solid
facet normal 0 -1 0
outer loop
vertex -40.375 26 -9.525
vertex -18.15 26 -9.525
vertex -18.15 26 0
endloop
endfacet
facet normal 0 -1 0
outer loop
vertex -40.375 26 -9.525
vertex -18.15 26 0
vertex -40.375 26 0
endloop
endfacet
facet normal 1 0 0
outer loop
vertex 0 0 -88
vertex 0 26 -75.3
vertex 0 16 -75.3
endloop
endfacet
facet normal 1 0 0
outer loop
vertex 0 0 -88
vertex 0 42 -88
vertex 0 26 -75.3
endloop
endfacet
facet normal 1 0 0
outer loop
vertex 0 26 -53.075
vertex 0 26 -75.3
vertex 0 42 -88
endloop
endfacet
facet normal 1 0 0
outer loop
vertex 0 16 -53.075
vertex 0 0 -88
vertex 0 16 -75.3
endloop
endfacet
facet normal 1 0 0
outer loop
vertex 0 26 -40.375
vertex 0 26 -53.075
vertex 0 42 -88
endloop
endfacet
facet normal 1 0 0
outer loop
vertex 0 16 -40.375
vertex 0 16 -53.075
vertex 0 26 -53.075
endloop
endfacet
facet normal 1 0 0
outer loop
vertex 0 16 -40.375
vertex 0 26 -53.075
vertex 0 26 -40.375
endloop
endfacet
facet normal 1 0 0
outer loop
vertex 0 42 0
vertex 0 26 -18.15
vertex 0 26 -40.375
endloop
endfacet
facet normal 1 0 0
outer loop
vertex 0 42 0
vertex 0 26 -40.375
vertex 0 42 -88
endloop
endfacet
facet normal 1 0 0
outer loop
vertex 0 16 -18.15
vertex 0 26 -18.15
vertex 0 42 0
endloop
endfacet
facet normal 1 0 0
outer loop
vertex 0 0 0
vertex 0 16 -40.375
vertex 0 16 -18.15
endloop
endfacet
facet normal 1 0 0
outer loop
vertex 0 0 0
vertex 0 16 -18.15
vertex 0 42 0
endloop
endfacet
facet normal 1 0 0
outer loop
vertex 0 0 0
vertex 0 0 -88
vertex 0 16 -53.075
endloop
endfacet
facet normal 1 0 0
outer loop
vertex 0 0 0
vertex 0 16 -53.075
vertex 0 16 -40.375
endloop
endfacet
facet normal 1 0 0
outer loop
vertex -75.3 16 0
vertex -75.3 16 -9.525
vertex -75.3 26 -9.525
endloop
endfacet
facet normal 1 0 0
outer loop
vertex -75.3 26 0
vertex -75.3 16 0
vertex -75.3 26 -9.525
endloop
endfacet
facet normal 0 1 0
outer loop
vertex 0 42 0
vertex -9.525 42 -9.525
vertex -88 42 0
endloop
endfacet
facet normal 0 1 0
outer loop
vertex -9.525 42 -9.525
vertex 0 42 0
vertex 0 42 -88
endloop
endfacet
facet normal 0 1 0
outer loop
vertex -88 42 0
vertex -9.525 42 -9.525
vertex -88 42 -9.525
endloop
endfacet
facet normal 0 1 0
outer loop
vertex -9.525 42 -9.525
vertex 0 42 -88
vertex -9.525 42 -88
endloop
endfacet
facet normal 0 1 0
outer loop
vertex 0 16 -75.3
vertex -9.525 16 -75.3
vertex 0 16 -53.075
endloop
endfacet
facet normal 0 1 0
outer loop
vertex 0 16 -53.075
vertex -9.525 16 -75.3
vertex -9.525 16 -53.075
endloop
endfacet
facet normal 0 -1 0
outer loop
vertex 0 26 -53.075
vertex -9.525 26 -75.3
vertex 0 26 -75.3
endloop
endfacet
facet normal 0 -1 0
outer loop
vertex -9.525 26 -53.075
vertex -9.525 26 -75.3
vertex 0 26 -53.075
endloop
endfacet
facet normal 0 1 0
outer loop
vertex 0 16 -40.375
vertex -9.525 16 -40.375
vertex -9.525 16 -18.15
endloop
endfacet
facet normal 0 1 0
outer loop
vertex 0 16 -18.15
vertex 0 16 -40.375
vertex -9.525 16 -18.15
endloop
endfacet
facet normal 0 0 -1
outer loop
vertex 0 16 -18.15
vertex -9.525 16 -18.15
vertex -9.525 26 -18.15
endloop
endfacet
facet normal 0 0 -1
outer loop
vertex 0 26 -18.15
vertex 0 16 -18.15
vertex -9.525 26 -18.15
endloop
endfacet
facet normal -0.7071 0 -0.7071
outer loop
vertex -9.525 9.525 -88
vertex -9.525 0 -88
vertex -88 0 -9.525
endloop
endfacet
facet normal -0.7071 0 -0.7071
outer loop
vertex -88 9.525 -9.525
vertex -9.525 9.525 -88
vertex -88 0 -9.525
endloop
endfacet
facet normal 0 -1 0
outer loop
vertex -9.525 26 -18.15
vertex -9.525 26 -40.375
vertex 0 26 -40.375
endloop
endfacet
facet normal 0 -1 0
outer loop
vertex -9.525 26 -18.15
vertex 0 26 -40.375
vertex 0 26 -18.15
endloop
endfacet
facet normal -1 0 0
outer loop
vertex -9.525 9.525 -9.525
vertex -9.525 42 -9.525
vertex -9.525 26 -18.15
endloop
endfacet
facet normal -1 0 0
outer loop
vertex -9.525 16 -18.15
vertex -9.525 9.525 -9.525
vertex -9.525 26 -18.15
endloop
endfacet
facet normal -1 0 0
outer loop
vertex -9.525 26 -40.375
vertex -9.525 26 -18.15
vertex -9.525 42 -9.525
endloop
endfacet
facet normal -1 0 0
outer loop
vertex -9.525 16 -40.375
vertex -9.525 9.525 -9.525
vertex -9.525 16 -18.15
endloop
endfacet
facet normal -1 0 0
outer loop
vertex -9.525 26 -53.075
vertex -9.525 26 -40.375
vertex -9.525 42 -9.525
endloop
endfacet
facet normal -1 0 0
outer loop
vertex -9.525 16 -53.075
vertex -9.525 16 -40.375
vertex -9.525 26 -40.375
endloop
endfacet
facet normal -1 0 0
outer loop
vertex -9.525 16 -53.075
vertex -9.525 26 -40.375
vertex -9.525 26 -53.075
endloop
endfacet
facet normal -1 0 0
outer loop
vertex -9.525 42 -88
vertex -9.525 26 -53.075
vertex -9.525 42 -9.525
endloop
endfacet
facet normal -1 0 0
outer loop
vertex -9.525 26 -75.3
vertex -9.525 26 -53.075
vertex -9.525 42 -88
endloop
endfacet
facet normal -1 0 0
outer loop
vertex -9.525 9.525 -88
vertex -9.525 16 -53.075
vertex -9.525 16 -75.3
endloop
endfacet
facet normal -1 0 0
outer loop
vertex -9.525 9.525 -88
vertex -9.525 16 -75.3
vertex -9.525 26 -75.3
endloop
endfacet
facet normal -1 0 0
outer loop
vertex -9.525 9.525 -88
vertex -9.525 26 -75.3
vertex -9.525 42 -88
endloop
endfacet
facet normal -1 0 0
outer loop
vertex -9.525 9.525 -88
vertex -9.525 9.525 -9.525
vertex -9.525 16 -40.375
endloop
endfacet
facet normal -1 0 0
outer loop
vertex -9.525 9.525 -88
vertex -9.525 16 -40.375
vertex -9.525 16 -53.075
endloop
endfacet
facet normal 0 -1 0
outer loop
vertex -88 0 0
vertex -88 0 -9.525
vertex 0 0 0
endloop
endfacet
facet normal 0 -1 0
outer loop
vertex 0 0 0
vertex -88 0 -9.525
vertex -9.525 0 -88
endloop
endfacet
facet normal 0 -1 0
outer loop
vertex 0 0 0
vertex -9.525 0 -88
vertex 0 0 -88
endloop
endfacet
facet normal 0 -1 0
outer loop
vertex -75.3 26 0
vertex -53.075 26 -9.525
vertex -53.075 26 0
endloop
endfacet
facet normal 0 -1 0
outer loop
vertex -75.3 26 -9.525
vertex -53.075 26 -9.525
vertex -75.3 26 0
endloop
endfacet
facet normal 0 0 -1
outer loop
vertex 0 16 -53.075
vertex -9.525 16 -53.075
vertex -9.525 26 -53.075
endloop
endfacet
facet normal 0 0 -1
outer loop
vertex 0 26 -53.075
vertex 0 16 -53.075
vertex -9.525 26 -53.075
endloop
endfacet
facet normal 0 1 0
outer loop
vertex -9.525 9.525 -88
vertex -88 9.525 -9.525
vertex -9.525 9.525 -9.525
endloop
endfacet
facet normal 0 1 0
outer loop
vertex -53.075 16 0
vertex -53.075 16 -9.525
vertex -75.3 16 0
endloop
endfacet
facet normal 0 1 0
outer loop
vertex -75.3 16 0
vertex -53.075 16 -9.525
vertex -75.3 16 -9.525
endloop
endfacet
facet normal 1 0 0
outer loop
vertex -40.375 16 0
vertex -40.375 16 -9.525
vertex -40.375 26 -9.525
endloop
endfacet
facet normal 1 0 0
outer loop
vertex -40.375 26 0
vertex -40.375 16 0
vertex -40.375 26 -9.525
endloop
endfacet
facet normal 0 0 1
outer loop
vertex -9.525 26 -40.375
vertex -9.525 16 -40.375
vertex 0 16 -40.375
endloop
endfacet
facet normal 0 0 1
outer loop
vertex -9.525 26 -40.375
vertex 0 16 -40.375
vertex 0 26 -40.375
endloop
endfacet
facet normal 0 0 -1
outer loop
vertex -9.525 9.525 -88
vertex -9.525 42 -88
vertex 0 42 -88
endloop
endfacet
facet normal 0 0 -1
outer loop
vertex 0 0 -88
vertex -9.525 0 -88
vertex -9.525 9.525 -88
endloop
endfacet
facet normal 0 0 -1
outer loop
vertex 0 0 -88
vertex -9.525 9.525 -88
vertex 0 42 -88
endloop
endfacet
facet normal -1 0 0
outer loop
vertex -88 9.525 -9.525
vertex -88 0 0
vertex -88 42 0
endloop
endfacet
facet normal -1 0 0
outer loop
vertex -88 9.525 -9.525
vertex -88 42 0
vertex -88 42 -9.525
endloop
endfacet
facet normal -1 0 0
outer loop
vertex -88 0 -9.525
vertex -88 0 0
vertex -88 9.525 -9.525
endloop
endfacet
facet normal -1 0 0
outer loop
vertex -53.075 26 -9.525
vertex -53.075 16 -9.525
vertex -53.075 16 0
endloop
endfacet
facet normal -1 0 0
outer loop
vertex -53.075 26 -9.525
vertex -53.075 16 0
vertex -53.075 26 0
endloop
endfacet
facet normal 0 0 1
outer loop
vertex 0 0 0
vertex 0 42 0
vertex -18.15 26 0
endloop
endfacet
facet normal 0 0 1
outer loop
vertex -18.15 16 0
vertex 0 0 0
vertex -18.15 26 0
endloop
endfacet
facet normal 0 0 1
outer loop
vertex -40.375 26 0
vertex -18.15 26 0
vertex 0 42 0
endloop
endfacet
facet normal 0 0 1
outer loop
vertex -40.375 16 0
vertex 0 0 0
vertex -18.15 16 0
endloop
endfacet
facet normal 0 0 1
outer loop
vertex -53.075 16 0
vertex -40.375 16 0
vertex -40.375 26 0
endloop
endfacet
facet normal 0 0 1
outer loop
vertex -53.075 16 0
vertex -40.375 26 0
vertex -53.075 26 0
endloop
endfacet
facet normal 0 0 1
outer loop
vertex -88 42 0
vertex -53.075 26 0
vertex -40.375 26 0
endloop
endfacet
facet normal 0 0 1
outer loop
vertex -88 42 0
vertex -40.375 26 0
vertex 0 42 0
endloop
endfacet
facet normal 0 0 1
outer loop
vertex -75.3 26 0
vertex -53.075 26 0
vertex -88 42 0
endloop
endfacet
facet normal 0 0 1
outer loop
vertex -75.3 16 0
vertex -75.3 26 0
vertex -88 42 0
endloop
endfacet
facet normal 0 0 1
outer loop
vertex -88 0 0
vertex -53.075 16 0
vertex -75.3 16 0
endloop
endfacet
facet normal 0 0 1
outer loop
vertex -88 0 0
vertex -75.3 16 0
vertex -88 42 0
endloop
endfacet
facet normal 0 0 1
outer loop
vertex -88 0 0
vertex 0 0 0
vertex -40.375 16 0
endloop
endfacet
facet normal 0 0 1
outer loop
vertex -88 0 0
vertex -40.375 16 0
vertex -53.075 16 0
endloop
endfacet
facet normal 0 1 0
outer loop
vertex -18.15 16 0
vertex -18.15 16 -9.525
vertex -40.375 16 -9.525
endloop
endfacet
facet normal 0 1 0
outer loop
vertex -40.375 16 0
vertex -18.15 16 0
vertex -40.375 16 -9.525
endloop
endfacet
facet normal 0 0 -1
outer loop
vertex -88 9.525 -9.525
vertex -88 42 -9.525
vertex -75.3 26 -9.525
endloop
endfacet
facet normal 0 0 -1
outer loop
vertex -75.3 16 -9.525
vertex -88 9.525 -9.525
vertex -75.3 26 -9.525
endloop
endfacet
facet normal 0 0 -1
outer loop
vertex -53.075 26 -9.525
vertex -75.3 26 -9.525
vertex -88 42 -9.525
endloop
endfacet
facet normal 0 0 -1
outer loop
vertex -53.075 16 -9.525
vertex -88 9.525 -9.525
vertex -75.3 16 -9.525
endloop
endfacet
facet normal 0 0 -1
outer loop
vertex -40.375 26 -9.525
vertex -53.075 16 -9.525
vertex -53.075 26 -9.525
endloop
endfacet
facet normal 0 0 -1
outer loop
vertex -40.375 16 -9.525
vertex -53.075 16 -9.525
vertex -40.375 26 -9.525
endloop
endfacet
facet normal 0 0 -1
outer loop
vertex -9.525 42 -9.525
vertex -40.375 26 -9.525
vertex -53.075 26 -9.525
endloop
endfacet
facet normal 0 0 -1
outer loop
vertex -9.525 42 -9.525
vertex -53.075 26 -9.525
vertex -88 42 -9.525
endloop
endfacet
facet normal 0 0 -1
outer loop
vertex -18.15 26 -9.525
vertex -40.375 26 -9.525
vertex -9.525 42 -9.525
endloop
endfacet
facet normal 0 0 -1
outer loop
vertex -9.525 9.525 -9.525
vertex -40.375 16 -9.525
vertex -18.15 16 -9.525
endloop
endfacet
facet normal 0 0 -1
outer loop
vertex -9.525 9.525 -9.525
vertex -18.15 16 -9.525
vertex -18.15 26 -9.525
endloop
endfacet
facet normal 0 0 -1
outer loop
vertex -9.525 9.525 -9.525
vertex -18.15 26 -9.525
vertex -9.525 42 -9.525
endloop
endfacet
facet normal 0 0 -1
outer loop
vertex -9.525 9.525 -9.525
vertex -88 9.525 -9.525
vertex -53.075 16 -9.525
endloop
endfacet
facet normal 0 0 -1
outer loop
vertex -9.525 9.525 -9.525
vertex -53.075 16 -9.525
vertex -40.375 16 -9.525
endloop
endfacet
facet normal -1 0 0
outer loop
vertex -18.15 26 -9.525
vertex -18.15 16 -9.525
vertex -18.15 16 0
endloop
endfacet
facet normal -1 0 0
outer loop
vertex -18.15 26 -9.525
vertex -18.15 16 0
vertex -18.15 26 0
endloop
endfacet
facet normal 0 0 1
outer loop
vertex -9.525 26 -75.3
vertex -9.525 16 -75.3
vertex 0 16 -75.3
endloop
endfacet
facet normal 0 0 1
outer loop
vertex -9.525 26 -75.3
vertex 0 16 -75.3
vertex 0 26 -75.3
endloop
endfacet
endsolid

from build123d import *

# Parameters (mm, degrees)
BOSS_EXTRUDE1_DEPTH = 42
BOSS_EXTRUDE2_DEPTH = 9.525
SKETCH3_W           = 22.225
SKETCH3_H           = 10
CUT_EXTRUDE1_DEPTH  = 9.525
SKETCH4_W           = 22.225
SKETCH4_H           = 10
CUT_EXTRUDE2_DEPTH  = 9.525


with BuildPart() as part:
    # Sketch1 → Boss-Extrude1 (new body)
    with BuildSketch(Plane(origin=(0, 0, 0), x_dir=(1, 0, 0), z_dir=(0, 1, 0))):
        Polygon((0, 0), (-88, 0), (-88, 9.525), (-9.525, 9.525), (-9.525, 88), (0, 88), align=None)
    extrude(amount=BOSS_EXTRUDE1_DEPTH)

    # Sketch2 → Boss-Extrude2 (add)
    with BuildSketch(Plane(origin=(0, 0, 0), x_dir=(1, 0, 0), z_dir=(0, 1, 0))):
        Polygon((-9.525, 88), (-88, 9.525), (-9.525, 9.525), align=None)
    extrude(amount=BOSS_EXTRUDE2_DEPTH)

    # Sketch3 → Cut-Extrude1 (cut)
    with BuildSketch(Plane(origin=(0, 0, -9.525), x_dir=(-1, 0, 0), z_dir=(0, 0, -1))):
        with Locations((29.2625, 21)):
            Rectangle(SKETCH3_W, SKETCH3_H)
        with Locations((64.1875, 21)):
            Rectangle(SKETCH3_W, SKETCH3_H)
    extrude(amount=-CUT_EXTRUDE1_DEPTH, mode=Mode.SUBTRACT)

    # Sketch4 → Cut-Extrude2 (cut)
    with BuildSketch(Plane.ZY.offset(9.525)):
        with Locations((-29.2625, 21)):
            Rectangle(SKETCH4_W, SKETCH4_H)
        with Locations((-64.1875, 21)):
            Rectangle(SKETCH4_W, SKETCH4_H)
    extrude(amount=-CUT_EXTRUDE2_DEPTH, mode=Mode.SUBTRACT)


solid = part.part
